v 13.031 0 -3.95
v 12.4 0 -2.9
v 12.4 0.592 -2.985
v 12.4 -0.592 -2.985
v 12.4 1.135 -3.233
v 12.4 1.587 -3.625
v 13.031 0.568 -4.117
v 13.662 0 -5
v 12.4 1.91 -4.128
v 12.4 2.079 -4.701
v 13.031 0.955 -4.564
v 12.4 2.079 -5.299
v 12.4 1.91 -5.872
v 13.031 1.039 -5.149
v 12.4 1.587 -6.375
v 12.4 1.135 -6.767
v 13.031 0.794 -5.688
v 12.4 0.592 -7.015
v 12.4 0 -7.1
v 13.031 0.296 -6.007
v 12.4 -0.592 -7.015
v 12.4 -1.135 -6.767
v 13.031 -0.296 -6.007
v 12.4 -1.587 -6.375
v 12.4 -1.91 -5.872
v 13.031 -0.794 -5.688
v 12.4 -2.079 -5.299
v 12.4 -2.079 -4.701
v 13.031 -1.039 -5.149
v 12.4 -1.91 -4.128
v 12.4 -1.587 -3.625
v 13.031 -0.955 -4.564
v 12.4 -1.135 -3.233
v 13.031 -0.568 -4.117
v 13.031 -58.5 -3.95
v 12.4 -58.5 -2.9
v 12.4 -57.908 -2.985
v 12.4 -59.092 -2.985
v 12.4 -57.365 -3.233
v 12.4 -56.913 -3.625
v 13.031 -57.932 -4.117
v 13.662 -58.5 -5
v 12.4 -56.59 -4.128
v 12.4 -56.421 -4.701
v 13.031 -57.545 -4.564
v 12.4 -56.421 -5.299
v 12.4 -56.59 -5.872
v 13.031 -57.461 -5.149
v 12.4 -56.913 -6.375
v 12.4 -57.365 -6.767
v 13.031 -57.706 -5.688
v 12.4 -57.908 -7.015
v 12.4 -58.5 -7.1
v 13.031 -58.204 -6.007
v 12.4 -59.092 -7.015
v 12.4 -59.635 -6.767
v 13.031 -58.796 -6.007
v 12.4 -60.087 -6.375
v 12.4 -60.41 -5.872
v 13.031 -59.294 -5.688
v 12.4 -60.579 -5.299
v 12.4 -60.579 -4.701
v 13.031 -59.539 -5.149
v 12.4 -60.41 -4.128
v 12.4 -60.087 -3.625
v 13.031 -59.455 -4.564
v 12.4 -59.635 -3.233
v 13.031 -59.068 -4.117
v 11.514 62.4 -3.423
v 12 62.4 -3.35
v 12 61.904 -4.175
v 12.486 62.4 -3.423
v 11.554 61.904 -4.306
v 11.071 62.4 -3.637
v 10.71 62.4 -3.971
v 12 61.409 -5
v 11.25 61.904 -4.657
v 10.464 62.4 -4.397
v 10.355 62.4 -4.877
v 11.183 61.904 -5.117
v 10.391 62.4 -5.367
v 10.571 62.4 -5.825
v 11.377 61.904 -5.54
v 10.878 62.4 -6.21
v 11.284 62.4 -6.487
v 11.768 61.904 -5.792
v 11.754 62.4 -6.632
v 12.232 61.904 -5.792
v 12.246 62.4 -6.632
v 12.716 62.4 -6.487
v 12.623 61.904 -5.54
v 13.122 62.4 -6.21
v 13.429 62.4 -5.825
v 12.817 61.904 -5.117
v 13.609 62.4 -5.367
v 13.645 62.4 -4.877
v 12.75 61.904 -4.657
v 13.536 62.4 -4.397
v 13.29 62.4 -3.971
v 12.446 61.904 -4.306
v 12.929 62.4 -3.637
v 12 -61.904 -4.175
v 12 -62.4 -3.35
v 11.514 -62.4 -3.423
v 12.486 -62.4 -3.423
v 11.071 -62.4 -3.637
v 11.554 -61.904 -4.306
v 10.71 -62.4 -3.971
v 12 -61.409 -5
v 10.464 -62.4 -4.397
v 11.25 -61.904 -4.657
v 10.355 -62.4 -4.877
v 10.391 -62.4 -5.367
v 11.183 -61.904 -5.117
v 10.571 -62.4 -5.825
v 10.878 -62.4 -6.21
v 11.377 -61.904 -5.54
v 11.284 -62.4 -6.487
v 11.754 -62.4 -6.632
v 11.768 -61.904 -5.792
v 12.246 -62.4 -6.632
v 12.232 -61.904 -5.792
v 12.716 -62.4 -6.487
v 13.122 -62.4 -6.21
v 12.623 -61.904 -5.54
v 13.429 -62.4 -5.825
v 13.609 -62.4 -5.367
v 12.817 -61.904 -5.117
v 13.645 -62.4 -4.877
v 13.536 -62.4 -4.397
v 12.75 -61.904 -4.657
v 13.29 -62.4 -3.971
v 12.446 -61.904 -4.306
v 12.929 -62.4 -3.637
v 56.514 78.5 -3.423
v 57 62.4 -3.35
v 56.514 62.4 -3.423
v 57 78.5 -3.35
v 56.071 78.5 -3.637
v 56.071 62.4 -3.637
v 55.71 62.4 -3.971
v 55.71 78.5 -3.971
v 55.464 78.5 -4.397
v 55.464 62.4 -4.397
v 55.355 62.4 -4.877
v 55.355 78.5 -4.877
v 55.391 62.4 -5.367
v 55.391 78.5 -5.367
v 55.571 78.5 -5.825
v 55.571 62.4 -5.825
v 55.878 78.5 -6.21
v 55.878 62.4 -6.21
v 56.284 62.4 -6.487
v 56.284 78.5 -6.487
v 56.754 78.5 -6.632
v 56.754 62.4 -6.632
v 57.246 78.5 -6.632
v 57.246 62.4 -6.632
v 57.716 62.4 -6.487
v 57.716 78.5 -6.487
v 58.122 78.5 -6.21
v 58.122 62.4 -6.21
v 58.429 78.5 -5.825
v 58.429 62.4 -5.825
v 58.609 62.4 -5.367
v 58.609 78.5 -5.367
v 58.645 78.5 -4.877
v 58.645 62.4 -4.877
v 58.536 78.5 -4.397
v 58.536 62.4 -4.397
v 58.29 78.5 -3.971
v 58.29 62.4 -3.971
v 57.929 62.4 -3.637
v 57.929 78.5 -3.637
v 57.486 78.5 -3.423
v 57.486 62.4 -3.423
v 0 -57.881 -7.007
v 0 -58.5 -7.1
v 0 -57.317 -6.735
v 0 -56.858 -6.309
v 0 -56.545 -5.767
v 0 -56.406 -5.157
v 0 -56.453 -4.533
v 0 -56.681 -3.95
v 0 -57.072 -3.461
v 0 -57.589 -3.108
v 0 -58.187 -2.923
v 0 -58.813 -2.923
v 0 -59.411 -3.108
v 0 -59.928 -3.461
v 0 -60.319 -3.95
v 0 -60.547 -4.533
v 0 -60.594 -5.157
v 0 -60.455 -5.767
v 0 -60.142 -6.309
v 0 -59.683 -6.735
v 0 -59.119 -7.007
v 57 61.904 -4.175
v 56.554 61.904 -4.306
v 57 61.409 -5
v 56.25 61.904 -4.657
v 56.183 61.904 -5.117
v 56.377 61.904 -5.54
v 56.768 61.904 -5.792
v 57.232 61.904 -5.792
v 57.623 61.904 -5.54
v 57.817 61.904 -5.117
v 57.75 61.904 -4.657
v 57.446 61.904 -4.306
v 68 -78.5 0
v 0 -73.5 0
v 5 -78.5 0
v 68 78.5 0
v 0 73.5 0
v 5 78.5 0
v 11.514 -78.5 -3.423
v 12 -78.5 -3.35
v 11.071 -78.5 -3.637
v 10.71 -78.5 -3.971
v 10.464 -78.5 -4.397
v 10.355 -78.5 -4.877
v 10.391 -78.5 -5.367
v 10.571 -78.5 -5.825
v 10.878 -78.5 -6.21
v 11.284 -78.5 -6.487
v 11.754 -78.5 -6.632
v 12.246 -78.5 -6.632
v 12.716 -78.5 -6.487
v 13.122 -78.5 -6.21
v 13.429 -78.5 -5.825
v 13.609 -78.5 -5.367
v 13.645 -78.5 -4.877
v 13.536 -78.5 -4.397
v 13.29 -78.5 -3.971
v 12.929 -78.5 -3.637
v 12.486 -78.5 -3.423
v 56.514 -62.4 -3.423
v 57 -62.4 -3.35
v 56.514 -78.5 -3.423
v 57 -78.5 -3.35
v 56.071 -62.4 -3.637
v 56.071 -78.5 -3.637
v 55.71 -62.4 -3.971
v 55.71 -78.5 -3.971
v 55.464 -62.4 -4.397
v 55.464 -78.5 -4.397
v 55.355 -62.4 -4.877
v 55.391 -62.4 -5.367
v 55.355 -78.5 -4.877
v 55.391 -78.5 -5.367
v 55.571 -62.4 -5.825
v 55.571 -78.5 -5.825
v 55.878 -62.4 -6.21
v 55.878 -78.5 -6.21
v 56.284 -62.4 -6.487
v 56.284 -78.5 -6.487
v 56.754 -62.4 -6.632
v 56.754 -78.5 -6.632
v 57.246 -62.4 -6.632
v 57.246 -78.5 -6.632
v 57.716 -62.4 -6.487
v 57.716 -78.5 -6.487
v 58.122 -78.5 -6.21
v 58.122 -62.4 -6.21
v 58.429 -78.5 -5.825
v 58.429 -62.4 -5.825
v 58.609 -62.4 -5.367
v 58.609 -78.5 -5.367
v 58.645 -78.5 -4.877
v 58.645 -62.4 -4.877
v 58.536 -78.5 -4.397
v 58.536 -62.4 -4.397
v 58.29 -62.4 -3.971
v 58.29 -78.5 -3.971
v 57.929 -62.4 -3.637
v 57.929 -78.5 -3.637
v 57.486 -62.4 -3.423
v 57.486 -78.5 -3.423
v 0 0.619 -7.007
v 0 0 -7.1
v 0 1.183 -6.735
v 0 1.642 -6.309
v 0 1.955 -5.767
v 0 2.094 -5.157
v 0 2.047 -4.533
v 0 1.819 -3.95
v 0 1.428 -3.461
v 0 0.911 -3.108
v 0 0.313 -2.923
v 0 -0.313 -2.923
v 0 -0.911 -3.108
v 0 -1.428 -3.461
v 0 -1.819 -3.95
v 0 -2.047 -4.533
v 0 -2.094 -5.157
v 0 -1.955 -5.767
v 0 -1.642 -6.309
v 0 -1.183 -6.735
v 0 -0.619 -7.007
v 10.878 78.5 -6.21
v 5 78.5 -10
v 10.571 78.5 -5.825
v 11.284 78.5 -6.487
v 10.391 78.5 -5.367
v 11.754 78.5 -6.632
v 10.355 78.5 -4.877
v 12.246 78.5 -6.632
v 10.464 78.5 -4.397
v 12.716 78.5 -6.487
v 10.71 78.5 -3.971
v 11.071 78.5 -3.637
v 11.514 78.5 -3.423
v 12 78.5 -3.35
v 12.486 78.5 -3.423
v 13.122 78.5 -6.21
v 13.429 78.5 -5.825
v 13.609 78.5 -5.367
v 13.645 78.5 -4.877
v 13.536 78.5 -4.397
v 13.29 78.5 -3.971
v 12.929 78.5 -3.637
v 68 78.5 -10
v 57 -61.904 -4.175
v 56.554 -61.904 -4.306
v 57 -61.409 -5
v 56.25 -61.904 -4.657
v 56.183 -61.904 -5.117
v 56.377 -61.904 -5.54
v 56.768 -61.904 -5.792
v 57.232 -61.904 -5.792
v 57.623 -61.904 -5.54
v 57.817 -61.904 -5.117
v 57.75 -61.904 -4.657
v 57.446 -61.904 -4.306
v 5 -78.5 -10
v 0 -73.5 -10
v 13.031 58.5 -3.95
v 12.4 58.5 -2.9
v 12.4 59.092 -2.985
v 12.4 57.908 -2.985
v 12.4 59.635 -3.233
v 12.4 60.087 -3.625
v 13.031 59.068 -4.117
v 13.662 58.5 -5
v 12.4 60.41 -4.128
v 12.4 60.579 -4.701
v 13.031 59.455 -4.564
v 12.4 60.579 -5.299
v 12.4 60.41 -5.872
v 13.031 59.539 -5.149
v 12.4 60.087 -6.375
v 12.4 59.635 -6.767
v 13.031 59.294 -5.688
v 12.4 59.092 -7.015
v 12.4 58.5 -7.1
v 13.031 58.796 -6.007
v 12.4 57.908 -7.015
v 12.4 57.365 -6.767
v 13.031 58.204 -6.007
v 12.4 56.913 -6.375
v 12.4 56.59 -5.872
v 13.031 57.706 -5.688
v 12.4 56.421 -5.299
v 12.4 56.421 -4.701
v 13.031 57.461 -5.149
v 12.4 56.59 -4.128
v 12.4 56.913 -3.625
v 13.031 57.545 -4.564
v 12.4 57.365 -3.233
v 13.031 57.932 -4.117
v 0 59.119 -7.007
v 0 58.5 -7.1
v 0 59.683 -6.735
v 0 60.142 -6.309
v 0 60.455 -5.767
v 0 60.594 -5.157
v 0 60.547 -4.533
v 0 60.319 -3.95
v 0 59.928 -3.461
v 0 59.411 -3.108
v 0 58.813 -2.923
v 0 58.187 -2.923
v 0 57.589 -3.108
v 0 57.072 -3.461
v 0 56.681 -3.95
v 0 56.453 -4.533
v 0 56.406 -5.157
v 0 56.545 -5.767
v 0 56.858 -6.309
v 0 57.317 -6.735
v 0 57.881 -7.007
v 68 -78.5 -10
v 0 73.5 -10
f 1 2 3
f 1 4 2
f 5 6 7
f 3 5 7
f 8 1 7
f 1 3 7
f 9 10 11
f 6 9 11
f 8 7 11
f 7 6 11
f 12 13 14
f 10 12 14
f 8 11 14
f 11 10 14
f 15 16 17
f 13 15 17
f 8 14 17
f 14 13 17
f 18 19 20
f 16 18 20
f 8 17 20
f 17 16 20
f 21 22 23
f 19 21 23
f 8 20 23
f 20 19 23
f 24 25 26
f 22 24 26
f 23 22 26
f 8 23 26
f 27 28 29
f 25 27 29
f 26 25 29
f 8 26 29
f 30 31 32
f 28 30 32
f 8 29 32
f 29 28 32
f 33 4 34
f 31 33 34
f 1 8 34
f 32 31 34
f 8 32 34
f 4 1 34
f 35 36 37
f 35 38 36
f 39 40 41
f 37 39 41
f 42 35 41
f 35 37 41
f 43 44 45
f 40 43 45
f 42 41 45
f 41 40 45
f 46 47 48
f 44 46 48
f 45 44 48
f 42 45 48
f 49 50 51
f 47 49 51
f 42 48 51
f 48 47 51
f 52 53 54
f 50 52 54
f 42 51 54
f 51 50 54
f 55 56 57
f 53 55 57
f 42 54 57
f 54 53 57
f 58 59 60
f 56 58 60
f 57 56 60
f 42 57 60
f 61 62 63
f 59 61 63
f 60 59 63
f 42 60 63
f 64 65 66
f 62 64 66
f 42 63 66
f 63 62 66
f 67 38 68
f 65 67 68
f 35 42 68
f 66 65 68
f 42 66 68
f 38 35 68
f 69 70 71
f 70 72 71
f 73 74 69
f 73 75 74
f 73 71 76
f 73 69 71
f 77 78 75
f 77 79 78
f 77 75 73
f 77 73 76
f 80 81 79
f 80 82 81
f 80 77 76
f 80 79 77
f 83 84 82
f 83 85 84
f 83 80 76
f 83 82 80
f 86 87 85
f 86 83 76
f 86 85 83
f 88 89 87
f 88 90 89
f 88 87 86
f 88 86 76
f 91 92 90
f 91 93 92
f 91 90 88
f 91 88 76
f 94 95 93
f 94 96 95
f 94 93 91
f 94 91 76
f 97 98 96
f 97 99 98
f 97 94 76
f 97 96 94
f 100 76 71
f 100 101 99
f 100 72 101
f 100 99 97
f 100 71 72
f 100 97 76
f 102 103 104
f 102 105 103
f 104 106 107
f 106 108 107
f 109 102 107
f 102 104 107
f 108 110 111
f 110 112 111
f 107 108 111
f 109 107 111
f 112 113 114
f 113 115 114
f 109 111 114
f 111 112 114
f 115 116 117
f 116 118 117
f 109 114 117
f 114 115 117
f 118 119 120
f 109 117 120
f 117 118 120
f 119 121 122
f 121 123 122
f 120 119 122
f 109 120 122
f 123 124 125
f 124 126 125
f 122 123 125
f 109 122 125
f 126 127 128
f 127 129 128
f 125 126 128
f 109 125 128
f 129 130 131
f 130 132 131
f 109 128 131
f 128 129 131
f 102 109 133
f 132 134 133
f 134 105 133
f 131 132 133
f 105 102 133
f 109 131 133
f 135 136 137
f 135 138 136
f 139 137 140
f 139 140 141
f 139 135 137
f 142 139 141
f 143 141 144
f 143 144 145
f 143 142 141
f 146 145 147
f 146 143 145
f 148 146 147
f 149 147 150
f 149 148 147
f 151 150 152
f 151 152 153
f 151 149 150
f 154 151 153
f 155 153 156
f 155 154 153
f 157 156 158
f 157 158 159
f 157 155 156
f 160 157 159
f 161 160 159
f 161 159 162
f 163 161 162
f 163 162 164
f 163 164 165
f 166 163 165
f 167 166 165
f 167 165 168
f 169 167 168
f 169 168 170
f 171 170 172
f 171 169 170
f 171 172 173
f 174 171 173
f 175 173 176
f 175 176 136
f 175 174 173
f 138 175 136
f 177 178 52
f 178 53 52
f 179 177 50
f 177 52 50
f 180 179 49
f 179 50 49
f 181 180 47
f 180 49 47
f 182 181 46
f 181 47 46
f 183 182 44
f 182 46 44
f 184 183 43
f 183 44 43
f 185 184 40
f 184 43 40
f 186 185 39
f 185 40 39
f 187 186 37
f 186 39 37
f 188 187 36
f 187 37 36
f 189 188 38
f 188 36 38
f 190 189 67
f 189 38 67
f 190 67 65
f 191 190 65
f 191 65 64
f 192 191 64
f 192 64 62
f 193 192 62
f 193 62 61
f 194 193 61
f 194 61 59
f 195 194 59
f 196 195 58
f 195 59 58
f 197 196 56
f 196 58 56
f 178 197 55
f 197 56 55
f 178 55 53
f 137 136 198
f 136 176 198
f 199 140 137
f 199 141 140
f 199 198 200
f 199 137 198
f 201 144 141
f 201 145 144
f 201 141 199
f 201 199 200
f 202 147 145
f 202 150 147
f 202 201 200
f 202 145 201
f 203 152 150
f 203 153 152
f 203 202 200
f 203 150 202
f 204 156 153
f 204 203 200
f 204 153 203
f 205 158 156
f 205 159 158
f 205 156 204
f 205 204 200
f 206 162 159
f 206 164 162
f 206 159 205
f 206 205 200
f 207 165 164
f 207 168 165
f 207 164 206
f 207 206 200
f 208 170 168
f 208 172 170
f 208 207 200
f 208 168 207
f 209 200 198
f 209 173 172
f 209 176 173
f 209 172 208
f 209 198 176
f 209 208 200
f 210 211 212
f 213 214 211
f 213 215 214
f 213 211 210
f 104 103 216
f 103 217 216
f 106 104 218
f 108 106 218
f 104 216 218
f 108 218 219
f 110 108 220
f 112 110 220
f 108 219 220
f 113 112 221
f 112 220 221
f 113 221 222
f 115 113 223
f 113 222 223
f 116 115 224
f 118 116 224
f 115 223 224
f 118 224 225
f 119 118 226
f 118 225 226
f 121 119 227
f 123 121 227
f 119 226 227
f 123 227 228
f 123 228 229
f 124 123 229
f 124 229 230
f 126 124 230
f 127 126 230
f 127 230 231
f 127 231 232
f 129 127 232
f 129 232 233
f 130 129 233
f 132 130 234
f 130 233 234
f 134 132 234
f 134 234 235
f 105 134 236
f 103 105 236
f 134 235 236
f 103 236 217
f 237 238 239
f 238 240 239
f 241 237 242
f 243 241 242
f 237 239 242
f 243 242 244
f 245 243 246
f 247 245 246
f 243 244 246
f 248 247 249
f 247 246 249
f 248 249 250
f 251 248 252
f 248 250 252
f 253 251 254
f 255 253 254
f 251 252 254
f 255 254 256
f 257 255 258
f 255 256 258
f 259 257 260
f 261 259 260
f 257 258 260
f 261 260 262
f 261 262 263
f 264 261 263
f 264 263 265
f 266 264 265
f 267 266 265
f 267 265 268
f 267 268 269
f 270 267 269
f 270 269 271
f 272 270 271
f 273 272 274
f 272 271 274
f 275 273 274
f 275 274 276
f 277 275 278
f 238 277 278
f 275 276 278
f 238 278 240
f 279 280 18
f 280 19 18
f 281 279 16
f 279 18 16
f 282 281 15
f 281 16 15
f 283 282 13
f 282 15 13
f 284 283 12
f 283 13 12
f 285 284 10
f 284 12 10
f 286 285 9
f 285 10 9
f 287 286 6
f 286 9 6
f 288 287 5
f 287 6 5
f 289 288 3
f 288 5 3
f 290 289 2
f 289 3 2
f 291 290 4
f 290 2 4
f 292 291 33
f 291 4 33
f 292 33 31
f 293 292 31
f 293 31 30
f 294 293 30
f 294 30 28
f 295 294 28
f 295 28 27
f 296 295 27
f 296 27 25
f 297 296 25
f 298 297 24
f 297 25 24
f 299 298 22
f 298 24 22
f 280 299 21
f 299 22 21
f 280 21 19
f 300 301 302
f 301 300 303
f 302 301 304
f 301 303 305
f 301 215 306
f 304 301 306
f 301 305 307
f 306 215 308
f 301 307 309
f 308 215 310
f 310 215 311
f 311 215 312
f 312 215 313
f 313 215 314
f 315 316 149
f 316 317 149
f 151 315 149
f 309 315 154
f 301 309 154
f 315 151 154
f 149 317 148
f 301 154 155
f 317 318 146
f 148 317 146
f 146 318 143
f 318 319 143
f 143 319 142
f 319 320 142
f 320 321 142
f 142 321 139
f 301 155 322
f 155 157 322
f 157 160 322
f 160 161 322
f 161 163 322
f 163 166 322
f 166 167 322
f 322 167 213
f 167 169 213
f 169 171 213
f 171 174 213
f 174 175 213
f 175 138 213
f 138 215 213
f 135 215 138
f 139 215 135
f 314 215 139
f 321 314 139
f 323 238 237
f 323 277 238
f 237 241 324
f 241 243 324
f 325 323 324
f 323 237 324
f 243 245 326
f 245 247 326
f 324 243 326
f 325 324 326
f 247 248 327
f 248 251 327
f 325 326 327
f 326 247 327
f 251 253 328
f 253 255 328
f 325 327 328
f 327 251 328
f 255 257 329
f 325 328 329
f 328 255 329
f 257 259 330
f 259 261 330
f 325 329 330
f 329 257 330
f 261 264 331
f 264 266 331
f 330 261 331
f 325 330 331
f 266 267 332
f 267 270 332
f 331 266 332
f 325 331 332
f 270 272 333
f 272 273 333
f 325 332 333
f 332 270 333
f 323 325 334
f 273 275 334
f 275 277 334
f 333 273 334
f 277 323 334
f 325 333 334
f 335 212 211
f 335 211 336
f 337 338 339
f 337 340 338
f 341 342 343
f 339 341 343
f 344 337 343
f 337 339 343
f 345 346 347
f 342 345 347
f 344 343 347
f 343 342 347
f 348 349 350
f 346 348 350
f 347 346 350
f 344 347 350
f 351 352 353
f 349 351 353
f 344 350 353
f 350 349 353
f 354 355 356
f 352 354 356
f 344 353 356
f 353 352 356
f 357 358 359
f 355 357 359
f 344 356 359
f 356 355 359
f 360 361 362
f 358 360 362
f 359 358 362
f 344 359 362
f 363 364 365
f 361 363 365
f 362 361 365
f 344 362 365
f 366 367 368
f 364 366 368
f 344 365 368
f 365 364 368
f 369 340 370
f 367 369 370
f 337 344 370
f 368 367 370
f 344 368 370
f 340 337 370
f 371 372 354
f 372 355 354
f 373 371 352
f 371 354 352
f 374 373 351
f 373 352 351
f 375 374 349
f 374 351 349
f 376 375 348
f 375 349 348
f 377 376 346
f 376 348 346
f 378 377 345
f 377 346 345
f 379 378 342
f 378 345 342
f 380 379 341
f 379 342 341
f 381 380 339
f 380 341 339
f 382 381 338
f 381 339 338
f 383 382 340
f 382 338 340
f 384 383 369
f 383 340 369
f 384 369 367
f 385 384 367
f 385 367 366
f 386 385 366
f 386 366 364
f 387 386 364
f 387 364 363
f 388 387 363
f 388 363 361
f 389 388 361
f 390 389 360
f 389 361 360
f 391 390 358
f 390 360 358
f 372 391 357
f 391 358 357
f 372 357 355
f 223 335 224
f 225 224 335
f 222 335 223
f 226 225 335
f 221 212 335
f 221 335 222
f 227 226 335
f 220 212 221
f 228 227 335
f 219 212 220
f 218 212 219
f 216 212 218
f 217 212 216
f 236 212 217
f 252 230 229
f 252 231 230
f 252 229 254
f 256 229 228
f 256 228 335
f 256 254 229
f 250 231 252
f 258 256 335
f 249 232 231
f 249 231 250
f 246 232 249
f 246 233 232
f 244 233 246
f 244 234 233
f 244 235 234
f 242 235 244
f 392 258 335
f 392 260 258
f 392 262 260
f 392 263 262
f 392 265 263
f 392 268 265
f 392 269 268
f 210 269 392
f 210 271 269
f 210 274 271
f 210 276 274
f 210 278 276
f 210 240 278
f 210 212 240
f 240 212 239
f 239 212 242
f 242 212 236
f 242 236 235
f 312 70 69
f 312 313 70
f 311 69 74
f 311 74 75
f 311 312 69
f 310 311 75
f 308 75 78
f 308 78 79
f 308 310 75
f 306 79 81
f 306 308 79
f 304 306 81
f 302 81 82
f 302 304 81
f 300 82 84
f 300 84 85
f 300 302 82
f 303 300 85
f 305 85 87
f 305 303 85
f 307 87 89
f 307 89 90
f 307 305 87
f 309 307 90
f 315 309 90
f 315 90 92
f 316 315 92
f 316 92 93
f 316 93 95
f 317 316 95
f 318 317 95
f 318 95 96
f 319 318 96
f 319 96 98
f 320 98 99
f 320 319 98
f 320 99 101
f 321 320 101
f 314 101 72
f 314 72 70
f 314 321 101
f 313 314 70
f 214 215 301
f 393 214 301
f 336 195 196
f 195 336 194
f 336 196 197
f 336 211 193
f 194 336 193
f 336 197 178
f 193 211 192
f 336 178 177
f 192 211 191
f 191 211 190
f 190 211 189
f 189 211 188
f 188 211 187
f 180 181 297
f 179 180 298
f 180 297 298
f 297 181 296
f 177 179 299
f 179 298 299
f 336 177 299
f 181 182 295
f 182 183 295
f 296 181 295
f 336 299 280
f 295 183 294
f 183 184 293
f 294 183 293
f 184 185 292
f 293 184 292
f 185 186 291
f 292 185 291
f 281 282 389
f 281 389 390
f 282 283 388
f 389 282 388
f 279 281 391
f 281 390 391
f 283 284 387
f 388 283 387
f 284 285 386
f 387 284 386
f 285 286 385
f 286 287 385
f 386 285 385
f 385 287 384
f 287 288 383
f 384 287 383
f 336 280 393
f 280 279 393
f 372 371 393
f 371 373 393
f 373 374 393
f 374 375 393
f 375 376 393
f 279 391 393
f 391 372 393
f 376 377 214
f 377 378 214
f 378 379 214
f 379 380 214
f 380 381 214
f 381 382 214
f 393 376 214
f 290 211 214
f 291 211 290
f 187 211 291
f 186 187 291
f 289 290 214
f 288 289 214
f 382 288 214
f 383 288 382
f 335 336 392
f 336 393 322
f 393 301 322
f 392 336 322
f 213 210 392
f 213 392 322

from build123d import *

# Parameters (mm, degrees)
SKETCH1_W                      = 68
SKETCH1_H                      = 157
BOSS_EXTRUDE1_DEPTH            = 10
M5X0_8_TAPPED_HOLE1_D          = 4.2
M5X0_8_TAPPED_HOLE1_DEPTH      = 12.4
M5X0_8_TAPPED_HOLE1_TIP        = 1.2618073
M4X0_7_TAPPED_HOLE1_AT_2_COUNT = 2
M4X0_7_TAPPED_HOLE1_AT_2_PITCH = 45
CHAMFER1_SIZE                  = 5


with BuildPart() as part:
    # Sketch1 → Boss-Extrude1 (new body)
    with BuildSketch(Plane.XY):
        with Locations((34, 0)):
            Rectangle(SKETCH1_W, SKETCH1_H)
    extrude(amount=-BOSS_EXTRUDE1_DEPTH)

    # M5x0.8 Tapped Hole1
    with Locations(Plane.ZY):
        with Locations((-5, 58.5), (-5, 0), (-5, -58.5)):
            Hole(M5X0_8_TAPPED_HOLE1_D / 2, depth=M5X0_8_TAPPED_HOLE1_DEPTH)
            with Locations((0, 0, -(M5X0_8_TAPPED_HOLE1_DEPTH + M5X0_8_TAPPED_HOLE1_TIP / 2))):  # 118° drill point
                Cone(0, M5X0_8_TAPPED_HOLE1_D / 2, M5X0_8_TAPPED_HOLE1_TIP, mode=Mode.SUBTRACT)

    # Sketch4 → M4x0.7 Tapped Hole1 (revolve, cut)
    with BuildSketch(Plane(origin=(12, 78.5, -5), x_dir=(0, 0, 1), z_dir=(1, 0, 0))):
        Polygon((0, 0), (0, 17.091420021), (1.65, 16.1), (1.65, 0), align=None)
    m4x0_7_tapped_hole1 = revolve(axis=Axis((12, 84.85, -5), (0, -1, 0)), mode=Mode.SUBTRACT)

    # M4x0.7 Tapped Hole1 at 2: M4x0.7 Tapped Hole1 ×2
    with Locations(*[(i * M4X0_7_TAPPED_HOLE1_AT_2_PITCH, 0, 0) for i in range(1, M4X0_7_TAPPED_HOLE1_AT_2_COUNT)]):
        add(m4x0_7_tapped_hole1, mode=Mode.SUBTRACT)

    # Mirror1: M4x0.7 Tapped Hole1 across plane
    add(m4x0_7_tapped_hole1.mirror(Plane.ZX), mode=Mode.SUBTRACT)

    # Mirror1 copy 1 sketch → Mirror1 copy 1 (revolve, cut)
    with BuildSketch(Plane(origin=(57, -78.5, -5), x_dir=(0, 0, 1), z_dir=(1, 0, 0))):
        Polygon((0, 0), (0, -17.091420021), (1.65, -16.1), (1.65, 0), align=None)
    revolve(axis=Axis((57, -84.85, -5), (0, -1, 0)), mode=Mode.SUBTRACT)

    # Chamfer1
    chamfer1_edges = [part.edges().sort_by_distance(p)[0] for p in [
        (0, -78.5, -5),
        (0, 78.5, -5),
    ]]
    chamfer(chamfer1_edges, length=CHAMFER1_SIZE)


solid = part.part
